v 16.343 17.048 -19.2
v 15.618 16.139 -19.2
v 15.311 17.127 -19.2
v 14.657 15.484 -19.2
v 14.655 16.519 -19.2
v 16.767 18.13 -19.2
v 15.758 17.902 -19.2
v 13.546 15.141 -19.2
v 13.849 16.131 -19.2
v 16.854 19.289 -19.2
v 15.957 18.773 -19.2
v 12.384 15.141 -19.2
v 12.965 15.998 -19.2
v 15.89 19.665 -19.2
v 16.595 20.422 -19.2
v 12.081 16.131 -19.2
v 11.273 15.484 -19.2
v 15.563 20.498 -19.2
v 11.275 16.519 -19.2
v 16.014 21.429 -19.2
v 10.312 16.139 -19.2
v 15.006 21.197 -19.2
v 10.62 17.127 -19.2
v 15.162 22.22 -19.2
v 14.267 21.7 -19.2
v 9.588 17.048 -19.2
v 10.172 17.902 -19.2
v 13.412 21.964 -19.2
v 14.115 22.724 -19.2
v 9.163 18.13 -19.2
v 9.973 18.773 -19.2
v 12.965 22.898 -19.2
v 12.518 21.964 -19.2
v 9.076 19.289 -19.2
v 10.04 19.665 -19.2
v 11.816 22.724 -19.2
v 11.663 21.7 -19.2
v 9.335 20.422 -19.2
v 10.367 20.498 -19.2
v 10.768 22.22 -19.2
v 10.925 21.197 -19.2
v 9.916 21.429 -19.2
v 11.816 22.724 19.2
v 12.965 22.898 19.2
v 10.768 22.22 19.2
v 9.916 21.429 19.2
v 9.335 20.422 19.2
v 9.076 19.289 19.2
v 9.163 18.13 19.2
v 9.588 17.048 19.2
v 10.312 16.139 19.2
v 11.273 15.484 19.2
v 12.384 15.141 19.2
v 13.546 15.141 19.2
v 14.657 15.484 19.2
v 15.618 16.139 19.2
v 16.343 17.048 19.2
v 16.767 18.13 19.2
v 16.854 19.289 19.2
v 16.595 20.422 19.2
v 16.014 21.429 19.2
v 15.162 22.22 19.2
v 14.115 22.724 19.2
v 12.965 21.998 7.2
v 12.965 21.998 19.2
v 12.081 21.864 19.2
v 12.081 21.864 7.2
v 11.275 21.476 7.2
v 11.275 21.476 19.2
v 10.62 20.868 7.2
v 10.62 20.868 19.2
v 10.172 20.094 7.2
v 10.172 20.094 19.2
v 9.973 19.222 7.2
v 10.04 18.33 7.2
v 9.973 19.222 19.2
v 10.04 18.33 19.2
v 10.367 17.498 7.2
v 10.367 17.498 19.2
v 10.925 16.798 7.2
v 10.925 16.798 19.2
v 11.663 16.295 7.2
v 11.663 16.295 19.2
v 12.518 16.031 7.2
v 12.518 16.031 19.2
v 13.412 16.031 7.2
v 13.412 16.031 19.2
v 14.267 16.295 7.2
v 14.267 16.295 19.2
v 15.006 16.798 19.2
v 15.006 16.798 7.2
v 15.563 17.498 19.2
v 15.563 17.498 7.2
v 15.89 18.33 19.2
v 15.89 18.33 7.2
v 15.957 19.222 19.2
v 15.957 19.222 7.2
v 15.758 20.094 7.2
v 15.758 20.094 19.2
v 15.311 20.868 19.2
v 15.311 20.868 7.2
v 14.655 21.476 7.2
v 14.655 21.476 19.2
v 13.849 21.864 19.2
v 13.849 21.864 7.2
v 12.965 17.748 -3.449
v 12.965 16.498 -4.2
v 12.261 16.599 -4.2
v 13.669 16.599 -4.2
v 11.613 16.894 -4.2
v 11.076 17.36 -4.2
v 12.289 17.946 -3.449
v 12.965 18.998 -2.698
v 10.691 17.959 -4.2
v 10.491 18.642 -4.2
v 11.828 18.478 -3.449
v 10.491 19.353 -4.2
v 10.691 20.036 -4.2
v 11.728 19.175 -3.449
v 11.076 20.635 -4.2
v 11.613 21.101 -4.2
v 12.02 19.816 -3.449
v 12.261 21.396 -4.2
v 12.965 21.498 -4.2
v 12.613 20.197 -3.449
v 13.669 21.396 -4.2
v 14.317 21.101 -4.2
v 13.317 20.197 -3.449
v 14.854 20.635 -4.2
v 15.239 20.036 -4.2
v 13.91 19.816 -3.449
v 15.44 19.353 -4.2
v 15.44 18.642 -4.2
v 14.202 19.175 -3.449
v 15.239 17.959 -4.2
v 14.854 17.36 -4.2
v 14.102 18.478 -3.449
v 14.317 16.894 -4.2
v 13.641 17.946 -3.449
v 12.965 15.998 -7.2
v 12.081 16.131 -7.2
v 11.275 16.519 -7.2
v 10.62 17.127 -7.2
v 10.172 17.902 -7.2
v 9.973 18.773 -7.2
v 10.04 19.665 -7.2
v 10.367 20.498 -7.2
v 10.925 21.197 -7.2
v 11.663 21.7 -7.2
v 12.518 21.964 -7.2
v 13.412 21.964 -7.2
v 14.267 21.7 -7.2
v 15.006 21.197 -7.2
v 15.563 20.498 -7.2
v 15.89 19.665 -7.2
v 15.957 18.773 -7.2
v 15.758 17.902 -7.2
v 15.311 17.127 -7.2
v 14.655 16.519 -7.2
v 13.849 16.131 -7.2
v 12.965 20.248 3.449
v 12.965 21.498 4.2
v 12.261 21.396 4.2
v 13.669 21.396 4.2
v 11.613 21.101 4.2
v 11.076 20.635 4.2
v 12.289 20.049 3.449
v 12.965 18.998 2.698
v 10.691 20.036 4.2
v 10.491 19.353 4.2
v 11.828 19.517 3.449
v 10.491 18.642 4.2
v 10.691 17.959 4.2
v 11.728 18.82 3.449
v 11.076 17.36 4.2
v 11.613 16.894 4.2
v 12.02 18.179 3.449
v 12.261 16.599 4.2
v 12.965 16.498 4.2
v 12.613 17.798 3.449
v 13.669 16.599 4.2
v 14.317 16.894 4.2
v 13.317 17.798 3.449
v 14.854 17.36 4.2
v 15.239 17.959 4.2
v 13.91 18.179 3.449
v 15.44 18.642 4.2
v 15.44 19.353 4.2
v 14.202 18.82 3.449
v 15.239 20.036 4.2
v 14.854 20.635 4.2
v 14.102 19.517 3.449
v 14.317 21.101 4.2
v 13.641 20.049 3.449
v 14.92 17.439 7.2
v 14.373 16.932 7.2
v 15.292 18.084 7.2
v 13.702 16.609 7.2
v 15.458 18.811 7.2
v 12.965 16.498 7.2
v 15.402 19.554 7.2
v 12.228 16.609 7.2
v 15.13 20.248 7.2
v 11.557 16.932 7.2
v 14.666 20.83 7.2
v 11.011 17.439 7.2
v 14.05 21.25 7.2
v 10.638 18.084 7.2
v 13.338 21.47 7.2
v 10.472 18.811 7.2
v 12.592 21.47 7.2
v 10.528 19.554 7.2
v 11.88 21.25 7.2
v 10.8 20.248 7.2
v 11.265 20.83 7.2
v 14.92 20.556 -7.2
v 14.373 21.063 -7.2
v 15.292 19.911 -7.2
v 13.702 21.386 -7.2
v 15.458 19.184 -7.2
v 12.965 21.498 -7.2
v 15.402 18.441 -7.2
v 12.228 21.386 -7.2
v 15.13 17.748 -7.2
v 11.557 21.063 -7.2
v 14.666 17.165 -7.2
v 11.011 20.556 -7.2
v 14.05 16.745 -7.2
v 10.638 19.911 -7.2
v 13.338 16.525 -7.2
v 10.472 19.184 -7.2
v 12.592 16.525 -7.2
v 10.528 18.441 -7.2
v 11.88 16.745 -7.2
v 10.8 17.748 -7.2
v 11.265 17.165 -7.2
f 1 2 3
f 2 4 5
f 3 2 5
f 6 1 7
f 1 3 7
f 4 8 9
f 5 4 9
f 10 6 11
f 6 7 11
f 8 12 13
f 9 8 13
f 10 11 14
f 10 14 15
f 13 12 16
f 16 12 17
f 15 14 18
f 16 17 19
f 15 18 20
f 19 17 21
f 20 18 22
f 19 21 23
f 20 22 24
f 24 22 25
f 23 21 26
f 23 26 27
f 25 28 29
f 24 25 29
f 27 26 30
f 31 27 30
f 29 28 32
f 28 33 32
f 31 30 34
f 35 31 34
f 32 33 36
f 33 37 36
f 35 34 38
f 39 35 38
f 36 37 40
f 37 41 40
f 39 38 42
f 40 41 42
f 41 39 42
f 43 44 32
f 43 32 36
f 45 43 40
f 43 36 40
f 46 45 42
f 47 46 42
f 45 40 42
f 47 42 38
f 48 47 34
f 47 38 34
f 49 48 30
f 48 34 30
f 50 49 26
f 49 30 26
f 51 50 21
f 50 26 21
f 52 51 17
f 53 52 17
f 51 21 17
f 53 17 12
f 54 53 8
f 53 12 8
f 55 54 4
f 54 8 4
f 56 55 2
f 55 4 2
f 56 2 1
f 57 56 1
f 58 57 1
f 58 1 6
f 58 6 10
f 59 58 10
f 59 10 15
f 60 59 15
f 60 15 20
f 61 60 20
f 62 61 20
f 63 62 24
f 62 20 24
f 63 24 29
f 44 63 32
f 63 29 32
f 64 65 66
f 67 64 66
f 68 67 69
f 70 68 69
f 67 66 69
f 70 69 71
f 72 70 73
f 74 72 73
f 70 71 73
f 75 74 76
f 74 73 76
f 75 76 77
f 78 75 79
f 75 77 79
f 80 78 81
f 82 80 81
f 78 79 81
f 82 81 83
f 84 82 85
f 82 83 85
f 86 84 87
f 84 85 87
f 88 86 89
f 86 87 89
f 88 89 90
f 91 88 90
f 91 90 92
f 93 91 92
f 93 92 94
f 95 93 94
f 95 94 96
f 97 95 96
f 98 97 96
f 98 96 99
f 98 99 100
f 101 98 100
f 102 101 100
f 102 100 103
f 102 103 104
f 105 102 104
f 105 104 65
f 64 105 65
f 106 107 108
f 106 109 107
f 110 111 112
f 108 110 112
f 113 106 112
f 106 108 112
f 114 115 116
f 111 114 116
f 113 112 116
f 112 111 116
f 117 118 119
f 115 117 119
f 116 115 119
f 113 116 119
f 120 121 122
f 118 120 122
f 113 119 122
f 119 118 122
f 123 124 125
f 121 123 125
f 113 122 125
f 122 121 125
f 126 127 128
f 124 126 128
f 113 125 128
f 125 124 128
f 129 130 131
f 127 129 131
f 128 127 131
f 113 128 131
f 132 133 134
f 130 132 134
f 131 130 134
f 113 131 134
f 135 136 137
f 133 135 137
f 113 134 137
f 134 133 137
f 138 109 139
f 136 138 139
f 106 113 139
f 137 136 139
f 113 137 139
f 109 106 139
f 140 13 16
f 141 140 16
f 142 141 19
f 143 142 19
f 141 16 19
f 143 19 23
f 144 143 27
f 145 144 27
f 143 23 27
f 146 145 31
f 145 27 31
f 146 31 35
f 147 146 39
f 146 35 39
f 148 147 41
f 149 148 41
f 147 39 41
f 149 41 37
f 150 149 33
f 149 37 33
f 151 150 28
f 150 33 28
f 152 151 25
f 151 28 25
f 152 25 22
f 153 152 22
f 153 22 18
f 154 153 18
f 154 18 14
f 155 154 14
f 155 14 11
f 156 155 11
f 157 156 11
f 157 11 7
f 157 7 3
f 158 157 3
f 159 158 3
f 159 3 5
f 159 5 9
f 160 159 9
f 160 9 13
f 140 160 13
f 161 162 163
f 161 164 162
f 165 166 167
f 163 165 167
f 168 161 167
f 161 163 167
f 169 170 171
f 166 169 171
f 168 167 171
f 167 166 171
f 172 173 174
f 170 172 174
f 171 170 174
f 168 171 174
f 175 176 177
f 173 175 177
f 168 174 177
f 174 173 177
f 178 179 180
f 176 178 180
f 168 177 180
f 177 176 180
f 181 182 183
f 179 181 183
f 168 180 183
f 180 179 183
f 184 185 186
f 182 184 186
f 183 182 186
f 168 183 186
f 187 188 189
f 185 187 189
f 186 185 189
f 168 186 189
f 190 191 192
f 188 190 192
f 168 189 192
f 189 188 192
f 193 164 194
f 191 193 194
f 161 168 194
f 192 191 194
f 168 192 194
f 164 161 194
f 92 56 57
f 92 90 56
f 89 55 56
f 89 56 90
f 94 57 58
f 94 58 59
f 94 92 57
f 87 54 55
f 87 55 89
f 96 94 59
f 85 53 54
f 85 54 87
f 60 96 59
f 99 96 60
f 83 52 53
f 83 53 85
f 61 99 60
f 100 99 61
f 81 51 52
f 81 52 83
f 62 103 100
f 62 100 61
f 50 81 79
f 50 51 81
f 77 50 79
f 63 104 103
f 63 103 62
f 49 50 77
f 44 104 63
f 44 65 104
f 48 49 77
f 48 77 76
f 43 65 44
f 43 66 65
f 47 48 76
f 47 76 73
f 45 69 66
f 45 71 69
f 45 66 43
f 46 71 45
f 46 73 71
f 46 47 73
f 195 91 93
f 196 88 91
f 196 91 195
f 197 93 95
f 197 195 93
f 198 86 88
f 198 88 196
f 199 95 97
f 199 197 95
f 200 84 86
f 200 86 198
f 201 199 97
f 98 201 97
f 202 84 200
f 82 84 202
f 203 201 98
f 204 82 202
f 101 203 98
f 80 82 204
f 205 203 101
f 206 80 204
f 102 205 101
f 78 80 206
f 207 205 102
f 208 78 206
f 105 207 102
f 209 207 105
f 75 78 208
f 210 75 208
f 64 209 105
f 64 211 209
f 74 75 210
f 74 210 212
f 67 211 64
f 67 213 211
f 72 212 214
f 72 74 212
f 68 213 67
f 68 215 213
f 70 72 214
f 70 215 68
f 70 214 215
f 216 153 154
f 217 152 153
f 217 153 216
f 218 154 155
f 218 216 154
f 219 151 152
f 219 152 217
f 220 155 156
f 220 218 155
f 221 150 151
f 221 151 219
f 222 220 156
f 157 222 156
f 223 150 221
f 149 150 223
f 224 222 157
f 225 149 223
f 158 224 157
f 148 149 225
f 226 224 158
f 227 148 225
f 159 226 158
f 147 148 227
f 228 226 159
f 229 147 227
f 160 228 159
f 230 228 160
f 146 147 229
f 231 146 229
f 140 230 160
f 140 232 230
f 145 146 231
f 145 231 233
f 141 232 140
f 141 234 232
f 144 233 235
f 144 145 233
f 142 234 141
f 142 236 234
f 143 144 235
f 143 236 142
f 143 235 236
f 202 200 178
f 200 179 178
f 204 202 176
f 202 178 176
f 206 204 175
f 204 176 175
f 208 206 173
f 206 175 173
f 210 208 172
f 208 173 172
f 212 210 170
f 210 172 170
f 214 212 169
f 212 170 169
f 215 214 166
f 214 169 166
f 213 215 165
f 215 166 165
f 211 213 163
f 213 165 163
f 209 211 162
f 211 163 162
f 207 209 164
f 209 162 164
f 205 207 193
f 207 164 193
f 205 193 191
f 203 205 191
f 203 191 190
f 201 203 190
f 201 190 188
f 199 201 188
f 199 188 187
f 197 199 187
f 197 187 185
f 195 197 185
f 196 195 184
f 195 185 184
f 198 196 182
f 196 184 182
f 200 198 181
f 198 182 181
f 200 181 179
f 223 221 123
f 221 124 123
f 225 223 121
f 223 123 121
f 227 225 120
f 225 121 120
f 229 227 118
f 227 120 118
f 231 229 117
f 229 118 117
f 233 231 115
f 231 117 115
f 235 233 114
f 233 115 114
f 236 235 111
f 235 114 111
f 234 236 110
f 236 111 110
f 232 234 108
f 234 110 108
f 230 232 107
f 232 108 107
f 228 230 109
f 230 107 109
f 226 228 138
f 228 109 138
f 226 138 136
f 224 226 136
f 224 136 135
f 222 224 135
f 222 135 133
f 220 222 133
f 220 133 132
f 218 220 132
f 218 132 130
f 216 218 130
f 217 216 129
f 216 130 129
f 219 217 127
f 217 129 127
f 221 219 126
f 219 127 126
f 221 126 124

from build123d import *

# Parameters (mm, degrees)
EXTRUDE1_DEPTH                  = 19.2
EXTRUDE1_DEPTH_BACK             = 19.2
SKETCH1_R                       = 3.9
M6X1_0_TAPPED_HOLE3_D           = 5
M6X1_0_TAPPED_HOLE3_DEPTH       = 15
M6X1_0_TAPPED_HOLE3_CBORE_D     = 6
M6X1_0_TAPPED_HOLE3_CBORE_DEPTH = 12
M6X1_0_TAPPED_HOLE3_TIP         = 1.502151548
M6X1_0_TAPPED_HOLE4_D           = 5
M6X1_0_TAPPED_HOLE4_DEPTH       = 15
M6X1_0_TAPPED_HOLE4_CBORE_D     = 6
M6X1_0_TAPPED_HOLE4_CBORE_DEPTH = 12
M6X1_0_TAPPED_HOLE4_TIP         = 1.502151548


with BuildPart() as part:
    # Sketch1 → Extrude1 (new, two sides: drawn at the far end of the back side and taken through both)
    with BuildSketch(Plane.XY.offset(-EXTRUDE1_DEPTH_BACK)):
        with Locations(Location((12.965088215, 18.997538987, 0), (0, 0, 90))):
            Circle(SKETCH1_R)
    extrude(amount=EXTRUDE1_DEPTH + EXTRUDE1_DEPTH_BACK)

    # M6x1.0 Tapped Hole3
    with Locations(Plane(origin=(12.965088215, 18.997538987, 19.2), x_dir=(0, 1, 0), z_dir=(0, 0, 1))):
        with Locations((0, 0)):
            CounterBoreHole(M6X1_0_TAPPED_HOLE3_D / 2, M6X1_0_TAPPED_HOLE3_CBORE_D / 2, M6X1_0_TAPPED_HOLE3_CBORE_DEPTH, depth=M6X1_0_TAPPED_HOLE3_DEPTH)
            with Locations((0, 0, -(M6X1_0_TAPPED_HOLE3_DEPTH + M6X1_0_TAPPED_HOLE3_TIP / 2))):  # 118° drill point
                Cone(0, M6X1_0_TAPPED_HOLE3_D / 2, M6X1_0_TAPPED_HOLE3_TIP, mode=Mode.SUBTRACT)

    # M6x1.0 Tapped Hole4
    with Locations(Plane(origin=(12.965088215, 18.997538987, -19.2), x_dir=(0, -1, 0), z_dir=(0, 0, -1))):
        with Locations((0, 0)):
            CounterBoreHole(M6X1_0_TAPPED_HOLE4_D / 2, M6X1_0_TAPPED_HOLE4_CBORE_D / 2, M6X1_0_TAPPED_HOLE4_CBORE_DEPTH, depth=M6X1_0_TAPPED_HOLE4_DEPTH)
            with Locations((0, 0, -(M6X1_0_TAPPED_HOLE4_DEPTH + M6X1_0_TAPPED_HOLE4_TIP / 2))):  # 118° drill point
                Cone(0, M6X1_0_TAPPED_HOLE4_D / 2, M6X1_0_TAPPED_HOLE4_TIP, mode=Mode.SUBTRACT)


solid = part.part
